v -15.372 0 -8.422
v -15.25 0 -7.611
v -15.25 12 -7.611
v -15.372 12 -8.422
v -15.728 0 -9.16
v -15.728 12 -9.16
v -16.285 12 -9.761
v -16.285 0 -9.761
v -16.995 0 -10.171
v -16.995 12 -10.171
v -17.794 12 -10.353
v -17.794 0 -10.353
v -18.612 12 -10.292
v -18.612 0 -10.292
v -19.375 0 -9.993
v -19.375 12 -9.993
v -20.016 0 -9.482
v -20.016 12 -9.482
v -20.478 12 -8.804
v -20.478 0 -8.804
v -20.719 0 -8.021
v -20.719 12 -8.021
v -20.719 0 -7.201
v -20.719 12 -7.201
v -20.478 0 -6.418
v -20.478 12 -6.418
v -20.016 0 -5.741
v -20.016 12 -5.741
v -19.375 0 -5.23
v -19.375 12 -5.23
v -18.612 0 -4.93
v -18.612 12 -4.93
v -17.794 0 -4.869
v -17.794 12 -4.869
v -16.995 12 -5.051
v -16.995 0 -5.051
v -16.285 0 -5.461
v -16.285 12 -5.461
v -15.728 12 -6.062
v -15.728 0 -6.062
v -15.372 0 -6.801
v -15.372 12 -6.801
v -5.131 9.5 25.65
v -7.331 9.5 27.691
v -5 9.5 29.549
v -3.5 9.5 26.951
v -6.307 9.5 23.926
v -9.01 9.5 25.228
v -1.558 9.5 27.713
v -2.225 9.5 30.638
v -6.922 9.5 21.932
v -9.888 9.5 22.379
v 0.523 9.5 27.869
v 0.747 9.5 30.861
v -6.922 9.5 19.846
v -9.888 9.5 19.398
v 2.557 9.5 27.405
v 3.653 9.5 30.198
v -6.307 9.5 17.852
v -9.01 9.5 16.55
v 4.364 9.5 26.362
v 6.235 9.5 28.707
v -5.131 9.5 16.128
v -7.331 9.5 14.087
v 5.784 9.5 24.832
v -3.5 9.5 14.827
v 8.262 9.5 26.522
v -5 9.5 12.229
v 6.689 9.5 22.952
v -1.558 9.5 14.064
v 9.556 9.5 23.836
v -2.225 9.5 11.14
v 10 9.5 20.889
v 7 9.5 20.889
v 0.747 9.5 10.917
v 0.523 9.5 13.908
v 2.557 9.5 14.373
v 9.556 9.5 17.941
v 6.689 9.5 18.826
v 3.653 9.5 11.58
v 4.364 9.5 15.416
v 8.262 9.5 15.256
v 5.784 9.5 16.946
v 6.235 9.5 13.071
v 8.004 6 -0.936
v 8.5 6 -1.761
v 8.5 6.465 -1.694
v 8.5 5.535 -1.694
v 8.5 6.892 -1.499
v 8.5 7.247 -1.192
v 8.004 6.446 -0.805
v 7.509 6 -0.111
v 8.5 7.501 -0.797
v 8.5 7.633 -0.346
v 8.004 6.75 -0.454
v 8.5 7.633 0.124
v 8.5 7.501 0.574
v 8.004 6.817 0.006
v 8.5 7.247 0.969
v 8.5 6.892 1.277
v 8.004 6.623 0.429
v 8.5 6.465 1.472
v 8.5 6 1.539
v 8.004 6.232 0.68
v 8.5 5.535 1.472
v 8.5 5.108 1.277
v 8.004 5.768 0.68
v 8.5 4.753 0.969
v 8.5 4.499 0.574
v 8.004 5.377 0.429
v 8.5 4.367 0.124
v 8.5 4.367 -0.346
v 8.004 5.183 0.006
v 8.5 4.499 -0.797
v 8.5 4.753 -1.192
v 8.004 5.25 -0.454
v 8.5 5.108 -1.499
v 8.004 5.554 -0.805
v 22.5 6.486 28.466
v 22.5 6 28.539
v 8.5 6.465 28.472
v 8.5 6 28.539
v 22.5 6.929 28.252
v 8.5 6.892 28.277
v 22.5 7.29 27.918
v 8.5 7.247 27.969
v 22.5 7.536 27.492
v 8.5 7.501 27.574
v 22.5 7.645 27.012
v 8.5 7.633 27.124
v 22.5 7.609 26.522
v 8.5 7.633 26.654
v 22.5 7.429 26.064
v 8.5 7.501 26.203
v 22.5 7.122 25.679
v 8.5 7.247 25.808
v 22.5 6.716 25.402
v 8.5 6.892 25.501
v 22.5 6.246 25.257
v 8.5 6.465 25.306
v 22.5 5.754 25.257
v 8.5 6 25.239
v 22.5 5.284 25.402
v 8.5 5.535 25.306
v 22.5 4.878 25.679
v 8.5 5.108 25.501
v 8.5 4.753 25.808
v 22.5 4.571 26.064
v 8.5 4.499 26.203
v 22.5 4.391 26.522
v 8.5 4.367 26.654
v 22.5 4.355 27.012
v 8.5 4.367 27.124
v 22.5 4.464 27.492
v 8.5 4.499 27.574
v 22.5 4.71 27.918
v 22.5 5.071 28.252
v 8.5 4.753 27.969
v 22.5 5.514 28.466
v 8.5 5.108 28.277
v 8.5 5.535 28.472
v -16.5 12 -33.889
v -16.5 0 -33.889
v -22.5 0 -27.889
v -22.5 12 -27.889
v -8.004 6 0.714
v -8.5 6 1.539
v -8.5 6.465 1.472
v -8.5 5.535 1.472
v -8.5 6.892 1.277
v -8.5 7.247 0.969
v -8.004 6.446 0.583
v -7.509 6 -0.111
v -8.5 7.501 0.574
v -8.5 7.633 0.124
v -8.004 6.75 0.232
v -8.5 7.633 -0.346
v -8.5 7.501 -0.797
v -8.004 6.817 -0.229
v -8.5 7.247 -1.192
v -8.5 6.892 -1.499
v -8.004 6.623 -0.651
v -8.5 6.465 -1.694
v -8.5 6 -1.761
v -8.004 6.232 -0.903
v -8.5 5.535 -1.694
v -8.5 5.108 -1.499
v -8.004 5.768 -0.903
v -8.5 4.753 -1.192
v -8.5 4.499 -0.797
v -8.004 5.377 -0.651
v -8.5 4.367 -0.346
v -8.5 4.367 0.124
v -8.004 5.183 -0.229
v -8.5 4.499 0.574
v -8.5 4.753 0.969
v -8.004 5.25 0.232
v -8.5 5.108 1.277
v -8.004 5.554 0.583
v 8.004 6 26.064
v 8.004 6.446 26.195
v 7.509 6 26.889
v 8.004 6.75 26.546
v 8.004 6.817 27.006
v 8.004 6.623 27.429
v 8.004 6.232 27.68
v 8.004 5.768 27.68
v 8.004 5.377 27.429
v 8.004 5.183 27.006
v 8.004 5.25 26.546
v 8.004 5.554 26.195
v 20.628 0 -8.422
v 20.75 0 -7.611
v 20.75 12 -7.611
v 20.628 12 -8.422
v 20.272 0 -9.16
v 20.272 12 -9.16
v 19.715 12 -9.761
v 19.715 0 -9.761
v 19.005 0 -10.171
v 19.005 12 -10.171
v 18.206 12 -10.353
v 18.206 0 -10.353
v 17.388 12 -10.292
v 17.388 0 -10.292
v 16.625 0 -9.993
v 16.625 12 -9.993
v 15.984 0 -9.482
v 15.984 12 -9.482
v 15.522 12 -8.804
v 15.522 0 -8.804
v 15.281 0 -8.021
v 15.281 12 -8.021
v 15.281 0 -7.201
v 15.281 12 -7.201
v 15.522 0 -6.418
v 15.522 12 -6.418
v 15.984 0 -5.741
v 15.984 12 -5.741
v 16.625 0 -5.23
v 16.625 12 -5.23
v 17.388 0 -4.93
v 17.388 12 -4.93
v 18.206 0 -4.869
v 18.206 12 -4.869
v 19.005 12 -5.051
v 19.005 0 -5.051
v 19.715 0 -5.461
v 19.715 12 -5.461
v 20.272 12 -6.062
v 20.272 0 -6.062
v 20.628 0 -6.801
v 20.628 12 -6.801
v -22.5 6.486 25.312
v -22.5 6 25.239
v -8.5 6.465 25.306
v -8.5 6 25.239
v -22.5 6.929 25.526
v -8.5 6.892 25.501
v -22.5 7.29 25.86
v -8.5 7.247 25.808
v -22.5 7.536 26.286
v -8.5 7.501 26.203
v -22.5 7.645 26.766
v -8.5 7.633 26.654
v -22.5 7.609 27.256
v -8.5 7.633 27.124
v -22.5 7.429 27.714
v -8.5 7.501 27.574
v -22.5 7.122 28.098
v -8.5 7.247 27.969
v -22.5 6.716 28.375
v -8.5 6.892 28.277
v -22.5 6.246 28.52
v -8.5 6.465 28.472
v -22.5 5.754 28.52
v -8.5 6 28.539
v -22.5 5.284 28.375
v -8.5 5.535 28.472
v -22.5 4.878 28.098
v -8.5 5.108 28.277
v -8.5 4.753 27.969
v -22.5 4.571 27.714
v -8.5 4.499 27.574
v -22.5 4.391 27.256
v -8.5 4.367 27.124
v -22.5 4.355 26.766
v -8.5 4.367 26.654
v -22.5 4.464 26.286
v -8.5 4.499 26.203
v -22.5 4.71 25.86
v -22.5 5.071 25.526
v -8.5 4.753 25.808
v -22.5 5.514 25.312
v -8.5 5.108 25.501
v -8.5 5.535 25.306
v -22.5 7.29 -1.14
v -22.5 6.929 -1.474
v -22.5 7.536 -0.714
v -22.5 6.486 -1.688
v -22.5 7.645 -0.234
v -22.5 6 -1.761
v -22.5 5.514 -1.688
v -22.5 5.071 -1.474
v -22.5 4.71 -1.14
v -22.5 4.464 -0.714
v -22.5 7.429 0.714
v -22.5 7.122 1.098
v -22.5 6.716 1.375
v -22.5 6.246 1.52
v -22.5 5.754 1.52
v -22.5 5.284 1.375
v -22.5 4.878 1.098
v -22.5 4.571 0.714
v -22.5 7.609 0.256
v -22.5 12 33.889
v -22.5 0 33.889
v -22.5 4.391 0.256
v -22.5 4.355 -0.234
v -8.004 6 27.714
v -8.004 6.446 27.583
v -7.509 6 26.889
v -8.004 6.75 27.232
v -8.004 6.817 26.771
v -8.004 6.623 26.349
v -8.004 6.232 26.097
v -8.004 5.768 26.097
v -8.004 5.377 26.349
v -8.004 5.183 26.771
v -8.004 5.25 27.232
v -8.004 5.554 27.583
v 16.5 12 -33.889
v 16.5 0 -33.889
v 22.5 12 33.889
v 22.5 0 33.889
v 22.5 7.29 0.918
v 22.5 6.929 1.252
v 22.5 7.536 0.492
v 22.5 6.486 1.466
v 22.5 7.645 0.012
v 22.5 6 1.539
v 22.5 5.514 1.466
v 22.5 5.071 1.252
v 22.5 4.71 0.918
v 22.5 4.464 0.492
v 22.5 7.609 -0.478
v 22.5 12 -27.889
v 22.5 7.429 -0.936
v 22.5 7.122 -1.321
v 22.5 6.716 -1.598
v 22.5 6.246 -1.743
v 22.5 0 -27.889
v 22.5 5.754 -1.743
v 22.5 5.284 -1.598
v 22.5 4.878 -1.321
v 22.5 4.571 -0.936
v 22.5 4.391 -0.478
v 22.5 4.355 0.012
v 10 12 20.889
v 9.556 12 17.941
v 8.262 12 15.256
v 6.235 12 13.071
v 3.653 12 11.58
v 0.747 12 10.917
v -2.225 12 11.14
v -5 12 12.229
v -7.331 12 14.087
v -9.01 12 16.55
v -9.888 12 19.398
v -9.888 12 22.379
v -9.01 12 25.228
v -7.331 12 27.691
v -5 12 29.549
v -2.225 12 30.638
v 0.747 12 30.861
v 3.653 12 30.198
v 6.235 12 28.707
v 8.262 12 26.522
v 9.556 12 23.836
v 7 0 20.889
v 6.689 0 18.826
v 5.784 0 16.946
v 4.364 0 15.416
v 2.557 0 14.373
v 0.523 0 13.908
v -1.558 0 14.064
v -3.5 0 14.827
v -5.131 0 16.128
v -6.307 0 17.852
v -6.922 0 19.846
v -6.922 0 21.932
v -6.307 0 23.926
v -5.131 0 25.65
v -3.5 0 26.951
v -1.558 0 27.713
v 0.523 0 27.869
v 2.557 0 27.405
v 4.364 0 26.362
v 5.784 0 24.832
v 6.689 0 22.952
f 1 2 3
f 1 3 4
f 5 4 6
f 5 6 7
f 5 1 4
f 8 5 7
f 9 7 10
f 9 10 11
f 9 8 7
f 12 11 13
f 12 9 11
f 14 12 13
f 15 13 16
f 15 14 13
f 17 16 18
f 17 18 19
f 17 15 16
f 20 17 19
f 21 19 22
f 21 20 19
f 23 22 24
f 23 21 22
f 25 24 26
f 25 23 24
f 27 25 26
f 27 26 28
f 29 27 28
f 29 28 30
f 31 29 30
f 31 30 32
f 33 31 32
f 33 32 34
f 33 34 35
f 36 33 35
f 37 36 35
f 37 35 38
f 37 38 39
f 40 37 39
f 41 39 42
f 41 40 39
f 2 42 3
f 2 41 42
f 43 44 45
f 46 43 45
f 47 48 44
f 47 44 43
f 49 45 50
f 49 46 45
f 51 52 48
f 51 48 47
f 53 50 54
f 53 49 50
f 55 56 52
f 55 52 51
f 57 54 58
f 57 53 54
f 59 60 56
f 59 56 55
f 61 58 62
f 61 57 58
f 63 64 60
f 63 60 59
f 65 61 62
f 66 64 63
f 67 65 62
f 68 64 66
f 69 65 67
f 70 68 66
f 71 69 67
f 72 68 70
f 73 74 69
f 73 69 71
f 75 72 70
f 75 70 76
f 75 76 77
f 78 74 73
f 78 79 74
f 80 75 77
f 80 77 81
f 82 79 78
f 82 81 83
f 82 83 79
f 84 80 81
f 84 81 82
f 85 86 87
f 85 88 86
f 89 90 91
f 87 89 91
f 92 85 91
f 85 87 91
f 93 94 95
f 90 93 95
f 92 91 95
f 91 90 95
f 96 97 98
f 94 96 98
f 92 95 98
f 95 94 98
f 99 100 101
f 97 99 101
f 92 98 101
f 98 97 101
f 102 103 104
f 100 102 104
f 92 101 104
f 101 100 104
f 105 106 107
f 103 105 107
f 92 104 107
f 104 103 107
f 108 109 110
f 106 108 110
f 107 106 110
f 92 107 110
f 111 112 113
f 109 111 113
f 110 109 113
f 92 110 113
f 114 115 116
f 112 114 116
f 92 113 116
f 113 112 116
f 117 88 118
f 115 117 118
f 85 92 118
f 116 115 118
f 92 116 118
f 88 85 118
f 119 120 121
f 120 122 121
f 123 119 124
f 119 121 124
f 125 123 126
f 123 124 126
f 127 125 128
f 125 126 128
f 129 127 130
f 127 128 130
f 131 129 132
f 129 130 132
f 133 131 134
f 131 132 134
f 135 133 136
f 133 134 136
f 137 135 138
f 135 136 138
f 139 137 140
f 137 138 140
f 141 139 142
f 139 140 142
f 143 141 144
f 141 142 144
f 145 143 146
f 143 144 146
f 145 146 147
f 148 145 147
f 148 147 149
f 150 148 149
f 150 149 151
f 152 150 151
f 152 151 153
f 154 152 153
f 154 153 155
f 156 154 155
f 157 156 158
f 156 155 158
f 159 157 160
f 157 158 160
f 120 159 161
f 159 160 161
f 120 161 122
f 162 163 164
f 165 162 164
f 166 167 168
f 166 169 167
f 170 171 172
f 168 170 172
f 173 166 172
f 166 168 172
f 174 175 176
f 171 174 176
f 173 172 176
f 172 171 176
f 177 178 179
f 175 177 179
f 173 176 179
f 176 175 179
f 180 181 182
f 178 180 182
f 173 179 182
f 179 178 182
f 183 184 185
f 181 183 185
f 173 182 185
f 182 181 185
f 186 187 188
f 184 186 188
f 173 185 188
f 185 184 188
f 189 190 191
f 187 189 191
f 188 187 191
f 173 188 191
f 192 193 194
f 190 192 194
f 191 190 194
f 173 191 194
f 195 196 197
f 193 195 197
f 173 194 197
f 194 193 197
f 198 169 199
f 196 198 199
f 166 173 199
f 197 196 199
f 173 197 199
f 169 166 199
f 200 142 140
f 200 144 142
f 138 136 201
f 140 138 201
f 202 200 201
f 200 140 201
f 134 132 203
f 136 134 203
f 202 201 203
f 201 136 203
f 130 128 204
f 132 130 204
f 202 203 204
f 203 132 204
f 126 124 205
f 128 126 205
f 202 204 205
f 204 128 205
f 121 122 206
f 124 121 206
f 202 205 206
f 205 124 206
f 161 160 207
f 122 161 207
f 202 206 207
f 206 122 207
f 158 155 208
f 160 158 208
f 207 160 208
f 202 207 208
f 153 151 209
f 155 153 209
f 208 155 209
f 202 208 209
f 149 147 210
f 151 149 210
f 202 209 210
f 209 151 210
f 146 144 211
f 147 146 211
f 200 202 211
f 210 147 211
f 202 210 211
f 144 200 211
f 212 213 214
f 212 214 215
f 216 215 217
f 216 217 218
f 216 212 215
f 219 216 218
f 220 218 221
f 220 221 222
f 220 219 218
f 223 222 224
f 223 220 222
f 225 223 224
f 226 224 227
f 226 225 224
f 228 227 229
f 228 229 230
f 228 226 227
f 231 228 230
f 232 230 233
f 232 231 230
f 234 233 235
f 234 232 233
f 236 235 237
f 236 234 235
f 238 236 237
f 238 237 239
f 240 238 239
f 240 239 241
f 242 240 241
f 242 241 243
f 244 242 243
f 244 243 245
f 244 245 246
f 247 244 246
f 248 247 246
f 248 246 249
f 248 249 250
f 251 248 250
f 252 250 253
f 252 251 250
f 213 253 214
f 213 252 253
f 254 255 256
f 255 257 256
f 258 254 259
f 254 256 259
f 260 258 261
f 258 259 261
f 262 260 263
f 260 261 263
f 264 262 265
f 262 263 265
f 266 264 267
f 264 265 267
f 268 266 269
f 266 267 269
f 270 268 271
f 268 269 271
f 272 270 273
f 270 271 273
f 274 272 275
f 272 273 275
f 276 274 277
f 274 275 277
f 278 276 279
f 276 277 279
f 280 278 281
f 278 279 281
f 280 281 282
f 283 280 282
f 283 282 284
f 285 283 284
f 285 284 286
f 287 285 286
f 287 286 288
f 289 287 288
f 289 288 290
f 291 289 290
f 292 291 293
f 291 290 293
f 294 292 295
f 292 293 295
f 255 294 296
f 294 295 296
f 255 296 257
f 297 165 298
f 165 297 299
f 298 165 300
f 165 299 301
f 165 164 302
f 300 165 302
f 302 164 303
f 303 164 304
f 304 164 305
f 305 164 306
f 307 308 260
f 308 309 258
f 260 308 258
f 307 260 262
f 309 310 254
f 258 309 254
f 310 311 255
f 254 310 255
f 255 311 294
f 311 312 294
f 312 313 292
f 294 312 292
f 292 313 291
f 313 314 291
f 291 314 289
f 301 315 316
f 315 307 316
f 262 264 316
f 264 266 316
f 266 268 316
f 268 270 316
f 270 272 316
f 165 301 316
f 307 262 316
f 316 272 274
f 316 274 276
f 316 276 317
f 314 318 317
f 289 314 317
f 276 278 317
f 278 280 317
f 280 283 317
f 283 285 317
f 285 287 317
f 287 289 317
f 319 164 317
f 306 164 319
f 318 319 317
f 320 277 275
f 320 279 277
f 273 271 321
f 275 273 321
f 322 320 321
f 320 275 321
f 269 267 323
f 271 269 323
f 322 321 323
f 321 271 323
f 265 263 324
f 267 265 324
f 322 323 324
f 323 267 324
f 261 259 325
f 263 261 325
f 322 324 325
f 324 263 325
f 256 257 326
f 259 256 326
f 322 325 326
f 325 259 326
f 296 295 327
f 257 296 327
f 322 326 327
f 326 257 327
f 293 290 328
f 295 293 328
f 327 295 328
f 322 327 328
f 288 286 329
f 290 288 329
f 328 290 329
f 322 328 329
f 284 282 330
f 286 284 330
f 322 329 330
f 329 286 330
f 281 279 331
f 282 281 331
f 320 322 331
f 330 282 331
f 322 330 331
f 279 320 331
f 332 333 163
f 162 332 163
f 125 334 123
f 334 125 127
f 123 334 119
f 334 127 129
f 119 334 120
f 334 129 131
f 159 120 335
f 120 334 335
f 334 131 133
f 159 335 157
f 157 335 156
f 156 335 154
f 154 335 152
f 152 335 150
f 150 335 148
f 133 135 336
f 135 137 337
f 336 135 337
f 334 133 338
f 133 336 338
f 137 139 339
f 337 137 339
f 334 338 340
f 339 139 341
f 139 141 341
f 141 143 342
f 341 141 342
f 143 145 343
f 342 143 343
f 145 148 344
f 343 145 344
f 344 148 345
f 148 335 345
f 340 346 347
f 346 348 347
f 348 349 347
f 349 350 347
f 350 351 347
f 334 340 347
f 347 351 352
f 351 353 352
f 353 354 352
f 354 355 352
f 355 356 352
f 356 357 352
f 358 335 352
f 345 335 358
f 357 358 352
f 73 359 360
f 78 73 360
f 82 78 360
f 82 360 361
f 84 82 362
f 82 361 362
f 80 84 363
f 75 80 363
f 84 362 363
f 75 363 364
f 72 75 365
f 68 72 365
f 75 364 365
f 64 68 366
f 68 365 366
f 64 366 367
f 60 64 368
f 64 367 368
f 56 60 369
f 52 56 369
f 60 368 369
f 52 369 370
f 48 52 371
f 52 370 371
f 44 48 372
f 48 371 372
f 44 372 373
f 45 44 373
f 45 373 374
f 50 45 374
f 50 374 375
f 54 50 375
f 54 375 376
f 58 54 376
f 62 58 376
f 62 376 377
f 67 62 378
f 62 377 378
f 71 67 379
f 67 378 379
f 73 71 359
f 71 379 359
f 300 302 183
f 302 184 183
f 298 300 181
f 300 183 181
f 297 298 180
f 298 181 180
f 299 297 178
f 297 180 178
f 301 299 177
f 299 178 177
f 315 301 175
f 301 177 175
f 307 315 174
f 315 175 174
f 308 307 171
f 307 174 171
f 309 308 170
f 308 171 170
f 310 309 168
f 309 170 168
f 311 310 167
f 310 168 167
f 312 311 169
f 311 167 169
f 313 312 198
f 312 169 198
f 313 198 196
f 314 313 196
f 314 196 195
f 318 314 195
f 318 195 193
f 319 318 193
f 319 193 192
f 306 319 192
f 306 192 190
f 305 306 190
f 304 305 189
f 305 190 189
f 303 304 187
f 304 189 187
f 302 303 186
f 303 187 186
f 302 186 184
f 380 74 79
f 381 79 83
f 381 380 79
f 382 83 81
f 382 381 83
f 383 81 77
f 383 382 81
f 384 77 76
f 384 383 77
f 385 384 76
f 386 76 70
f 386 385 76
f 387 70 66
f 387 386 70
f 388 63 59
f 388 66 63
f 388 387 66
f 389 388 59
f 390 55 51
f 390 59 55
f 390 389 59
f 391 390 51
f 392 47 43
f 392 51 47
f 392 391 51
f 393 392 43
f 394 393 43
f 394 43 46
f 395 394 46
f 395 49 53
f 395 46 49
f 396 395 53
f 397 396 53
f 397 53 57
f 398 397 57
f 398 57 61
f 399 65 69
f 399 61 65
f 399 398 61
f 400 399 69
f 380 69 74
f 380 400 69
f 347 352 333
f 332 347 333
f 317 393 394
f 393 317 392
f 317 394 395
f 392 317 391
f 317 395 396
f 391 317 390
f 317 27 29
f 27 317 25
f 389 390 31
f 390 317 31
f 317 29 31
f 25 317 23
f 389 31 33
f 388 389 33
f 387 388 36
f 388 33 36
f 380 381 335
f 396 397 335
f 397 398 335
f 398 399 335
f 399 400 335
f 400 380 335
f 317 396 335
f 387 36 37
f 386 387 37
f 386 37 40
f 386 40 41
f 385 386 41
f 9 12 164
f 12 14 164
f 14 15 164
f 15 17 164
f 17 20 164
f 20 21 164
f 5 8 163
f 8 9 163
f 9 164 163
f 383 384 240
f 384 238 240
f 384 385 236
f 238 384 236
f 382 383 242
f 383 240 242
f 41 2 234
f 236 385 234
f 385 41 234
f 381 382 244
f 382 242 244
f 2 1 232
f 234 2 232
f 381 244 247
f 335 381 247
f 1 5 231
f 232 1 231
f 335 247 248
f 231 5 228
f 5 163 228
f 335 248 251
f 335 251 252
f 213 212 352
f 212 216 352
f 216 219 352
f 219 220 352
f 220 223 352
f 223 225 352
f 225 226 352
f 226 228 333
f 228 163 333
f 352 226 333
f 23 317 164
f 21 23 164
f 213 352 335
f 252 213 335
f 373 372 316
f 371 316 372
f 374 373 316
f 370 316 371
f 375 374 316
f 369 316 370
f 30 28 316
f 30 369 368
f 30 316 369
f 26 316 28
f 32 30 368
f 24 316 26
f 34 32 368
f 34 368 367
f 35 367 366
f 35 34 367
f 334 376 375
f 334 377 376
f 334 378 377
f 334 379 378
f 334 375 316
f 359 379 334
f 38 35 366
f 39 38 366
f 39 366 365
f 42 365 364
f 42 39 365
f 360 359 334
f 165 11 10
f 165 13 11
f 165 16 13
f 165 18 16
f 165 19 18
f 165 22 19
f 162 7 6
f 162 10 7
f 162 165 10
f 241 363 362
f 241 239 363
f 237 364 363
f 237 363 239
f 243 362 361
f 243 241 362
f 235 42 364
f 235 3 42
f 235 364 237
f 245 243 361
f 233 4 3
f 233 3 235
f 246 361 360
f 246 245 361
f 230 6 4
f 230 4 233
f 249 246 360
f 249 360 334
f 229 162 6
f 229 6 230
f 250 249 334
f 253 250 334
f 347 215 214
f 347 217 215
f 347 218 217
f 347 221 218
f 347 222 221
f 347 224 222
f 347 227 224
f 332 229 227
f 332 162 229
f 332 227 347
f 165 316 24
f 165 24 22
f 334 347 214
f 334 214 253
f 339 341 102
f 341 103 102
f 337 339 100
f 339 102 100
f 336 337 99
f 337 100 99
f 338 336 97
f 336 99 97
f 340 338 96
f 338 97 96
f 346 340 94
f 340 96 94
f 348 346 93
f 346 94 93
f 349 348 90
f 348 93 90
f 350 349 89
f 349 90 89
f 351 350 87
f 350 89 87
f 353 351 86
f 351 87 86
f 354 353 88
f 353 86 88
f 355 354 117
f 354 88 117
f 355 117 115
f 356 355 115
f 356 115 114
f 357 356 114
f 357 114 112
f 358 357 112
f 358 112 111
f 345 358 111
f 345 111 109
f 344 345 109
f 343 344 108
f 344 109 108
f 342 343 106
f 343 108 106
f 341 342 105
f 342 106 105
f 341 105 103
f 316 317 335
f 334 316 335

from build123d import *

# Parameters (mm, degrees)
SKETCH1_R             = 2.75
SKETCH1_R_2           = 7
BOSS_EXTRUDE1_DEPTH   = 12
M4_TAPPED_HOLE1_D     = 3.3
M4_TAPPED_HOLE1_DEPTH = 14
M4_TAPPED_HOLE1_TIP   = 0.991420021
M4_TAPPED_HOLE2_D     = 3.3
M4_TAPPED_HOLE2_DEPTH = 14
M4_TAPPED_HOLE2_TIP   = 0.991420021
SKETCH6_R             = 10
CUT_EXTRUDE1_DEPTH    = 2.5


with BuildPart() as part:
    # Sketch1 → Boss-Extrude1 (new body)
    with BuildSketch(Plane(origin=(0, 0, 0), x_dir=(1, 0, 0), z_dir=(0, 1, 0))):
        Polygon((-16.5, 33.888888889), (-22.5, 27.888888889), (-22.5, -33.888888889), (22.5, -33.888888889), (22.5, 27.888888889), (16.5, 33.888888889), align=None)
        with Locations((-18, 7.611111111)):
            Circle(SKETCH1_R, mode=Mode.SUBTRACT)
        with Locations((18, 7.611111111)):
            Circle(SKETCH1_R, mode=Mode.SUBTRACT)
        with Locations((0, -20.888888889)):
            Circle(SKETCH1_R_2, mode=Mode.SUBTRACT)
    extrude(amount=BOSS_EXTRUDE1_DEPTH)

    # M4 Tapped Hole1
    with Locations(Plane.ZY.offset(22.5)):
        with Locations((-0.111111111, 6), (26.888888889, 6)):
            Hole(M4_TAPPED_HOLE1_D / 2, depth=M4_TAPPED_HOLE1_DEPTH)
            with Locations((0, 0, -(M4_TAPPED_HOLE1_DEPTH + M4_TAPPED_HOLE1_TIP / 2))):  # 118° drill point
                Cone(0, M4_TAPPED_HOLE1_D / 2, M4_TAPPED_HOLE1_TIP, mode=Mode.SUBTRACT)

    # M4 Tapped Hole2
    with Locations(Plane(origin=(22.5, 0, 0), x_dir=(0, 0, -1), z_dir=(1, 0, 0))):
        with Locations((-26.888888889, 6), (0.111111111, 6)):
            Hole(M4_TAPPED_HOLE2_D / 2, depth=M4_TAPPED_HOLE2_DEPTH)
            with Locations((0, 0, -(M4_TAPPED_HOLE2_DEPTH + M4_TAPPED_HOLE2_TIP / 2))):  # 118° drill point
                Cone(0, M4_TAPPED_HOLE2_D / 2, M4_TAPPED_HOLE2_TIP, mode=Mode.SUBTRACT)

    # Sketch6 → Cut-Extrude1 (cut)
    with BuildSketch(Plane(origin=(0, 12, 0), x_dir=(1, 0, 0), z_dir=(0, 1, 0))):
        with Locations((0, -20.888888889)):
            Circle(SKETCH6_R)
    extrude(amount=-CUT_EXTRUDE1_DEPTH, mode=Mode.SUBTRACT)


solid = part.part
